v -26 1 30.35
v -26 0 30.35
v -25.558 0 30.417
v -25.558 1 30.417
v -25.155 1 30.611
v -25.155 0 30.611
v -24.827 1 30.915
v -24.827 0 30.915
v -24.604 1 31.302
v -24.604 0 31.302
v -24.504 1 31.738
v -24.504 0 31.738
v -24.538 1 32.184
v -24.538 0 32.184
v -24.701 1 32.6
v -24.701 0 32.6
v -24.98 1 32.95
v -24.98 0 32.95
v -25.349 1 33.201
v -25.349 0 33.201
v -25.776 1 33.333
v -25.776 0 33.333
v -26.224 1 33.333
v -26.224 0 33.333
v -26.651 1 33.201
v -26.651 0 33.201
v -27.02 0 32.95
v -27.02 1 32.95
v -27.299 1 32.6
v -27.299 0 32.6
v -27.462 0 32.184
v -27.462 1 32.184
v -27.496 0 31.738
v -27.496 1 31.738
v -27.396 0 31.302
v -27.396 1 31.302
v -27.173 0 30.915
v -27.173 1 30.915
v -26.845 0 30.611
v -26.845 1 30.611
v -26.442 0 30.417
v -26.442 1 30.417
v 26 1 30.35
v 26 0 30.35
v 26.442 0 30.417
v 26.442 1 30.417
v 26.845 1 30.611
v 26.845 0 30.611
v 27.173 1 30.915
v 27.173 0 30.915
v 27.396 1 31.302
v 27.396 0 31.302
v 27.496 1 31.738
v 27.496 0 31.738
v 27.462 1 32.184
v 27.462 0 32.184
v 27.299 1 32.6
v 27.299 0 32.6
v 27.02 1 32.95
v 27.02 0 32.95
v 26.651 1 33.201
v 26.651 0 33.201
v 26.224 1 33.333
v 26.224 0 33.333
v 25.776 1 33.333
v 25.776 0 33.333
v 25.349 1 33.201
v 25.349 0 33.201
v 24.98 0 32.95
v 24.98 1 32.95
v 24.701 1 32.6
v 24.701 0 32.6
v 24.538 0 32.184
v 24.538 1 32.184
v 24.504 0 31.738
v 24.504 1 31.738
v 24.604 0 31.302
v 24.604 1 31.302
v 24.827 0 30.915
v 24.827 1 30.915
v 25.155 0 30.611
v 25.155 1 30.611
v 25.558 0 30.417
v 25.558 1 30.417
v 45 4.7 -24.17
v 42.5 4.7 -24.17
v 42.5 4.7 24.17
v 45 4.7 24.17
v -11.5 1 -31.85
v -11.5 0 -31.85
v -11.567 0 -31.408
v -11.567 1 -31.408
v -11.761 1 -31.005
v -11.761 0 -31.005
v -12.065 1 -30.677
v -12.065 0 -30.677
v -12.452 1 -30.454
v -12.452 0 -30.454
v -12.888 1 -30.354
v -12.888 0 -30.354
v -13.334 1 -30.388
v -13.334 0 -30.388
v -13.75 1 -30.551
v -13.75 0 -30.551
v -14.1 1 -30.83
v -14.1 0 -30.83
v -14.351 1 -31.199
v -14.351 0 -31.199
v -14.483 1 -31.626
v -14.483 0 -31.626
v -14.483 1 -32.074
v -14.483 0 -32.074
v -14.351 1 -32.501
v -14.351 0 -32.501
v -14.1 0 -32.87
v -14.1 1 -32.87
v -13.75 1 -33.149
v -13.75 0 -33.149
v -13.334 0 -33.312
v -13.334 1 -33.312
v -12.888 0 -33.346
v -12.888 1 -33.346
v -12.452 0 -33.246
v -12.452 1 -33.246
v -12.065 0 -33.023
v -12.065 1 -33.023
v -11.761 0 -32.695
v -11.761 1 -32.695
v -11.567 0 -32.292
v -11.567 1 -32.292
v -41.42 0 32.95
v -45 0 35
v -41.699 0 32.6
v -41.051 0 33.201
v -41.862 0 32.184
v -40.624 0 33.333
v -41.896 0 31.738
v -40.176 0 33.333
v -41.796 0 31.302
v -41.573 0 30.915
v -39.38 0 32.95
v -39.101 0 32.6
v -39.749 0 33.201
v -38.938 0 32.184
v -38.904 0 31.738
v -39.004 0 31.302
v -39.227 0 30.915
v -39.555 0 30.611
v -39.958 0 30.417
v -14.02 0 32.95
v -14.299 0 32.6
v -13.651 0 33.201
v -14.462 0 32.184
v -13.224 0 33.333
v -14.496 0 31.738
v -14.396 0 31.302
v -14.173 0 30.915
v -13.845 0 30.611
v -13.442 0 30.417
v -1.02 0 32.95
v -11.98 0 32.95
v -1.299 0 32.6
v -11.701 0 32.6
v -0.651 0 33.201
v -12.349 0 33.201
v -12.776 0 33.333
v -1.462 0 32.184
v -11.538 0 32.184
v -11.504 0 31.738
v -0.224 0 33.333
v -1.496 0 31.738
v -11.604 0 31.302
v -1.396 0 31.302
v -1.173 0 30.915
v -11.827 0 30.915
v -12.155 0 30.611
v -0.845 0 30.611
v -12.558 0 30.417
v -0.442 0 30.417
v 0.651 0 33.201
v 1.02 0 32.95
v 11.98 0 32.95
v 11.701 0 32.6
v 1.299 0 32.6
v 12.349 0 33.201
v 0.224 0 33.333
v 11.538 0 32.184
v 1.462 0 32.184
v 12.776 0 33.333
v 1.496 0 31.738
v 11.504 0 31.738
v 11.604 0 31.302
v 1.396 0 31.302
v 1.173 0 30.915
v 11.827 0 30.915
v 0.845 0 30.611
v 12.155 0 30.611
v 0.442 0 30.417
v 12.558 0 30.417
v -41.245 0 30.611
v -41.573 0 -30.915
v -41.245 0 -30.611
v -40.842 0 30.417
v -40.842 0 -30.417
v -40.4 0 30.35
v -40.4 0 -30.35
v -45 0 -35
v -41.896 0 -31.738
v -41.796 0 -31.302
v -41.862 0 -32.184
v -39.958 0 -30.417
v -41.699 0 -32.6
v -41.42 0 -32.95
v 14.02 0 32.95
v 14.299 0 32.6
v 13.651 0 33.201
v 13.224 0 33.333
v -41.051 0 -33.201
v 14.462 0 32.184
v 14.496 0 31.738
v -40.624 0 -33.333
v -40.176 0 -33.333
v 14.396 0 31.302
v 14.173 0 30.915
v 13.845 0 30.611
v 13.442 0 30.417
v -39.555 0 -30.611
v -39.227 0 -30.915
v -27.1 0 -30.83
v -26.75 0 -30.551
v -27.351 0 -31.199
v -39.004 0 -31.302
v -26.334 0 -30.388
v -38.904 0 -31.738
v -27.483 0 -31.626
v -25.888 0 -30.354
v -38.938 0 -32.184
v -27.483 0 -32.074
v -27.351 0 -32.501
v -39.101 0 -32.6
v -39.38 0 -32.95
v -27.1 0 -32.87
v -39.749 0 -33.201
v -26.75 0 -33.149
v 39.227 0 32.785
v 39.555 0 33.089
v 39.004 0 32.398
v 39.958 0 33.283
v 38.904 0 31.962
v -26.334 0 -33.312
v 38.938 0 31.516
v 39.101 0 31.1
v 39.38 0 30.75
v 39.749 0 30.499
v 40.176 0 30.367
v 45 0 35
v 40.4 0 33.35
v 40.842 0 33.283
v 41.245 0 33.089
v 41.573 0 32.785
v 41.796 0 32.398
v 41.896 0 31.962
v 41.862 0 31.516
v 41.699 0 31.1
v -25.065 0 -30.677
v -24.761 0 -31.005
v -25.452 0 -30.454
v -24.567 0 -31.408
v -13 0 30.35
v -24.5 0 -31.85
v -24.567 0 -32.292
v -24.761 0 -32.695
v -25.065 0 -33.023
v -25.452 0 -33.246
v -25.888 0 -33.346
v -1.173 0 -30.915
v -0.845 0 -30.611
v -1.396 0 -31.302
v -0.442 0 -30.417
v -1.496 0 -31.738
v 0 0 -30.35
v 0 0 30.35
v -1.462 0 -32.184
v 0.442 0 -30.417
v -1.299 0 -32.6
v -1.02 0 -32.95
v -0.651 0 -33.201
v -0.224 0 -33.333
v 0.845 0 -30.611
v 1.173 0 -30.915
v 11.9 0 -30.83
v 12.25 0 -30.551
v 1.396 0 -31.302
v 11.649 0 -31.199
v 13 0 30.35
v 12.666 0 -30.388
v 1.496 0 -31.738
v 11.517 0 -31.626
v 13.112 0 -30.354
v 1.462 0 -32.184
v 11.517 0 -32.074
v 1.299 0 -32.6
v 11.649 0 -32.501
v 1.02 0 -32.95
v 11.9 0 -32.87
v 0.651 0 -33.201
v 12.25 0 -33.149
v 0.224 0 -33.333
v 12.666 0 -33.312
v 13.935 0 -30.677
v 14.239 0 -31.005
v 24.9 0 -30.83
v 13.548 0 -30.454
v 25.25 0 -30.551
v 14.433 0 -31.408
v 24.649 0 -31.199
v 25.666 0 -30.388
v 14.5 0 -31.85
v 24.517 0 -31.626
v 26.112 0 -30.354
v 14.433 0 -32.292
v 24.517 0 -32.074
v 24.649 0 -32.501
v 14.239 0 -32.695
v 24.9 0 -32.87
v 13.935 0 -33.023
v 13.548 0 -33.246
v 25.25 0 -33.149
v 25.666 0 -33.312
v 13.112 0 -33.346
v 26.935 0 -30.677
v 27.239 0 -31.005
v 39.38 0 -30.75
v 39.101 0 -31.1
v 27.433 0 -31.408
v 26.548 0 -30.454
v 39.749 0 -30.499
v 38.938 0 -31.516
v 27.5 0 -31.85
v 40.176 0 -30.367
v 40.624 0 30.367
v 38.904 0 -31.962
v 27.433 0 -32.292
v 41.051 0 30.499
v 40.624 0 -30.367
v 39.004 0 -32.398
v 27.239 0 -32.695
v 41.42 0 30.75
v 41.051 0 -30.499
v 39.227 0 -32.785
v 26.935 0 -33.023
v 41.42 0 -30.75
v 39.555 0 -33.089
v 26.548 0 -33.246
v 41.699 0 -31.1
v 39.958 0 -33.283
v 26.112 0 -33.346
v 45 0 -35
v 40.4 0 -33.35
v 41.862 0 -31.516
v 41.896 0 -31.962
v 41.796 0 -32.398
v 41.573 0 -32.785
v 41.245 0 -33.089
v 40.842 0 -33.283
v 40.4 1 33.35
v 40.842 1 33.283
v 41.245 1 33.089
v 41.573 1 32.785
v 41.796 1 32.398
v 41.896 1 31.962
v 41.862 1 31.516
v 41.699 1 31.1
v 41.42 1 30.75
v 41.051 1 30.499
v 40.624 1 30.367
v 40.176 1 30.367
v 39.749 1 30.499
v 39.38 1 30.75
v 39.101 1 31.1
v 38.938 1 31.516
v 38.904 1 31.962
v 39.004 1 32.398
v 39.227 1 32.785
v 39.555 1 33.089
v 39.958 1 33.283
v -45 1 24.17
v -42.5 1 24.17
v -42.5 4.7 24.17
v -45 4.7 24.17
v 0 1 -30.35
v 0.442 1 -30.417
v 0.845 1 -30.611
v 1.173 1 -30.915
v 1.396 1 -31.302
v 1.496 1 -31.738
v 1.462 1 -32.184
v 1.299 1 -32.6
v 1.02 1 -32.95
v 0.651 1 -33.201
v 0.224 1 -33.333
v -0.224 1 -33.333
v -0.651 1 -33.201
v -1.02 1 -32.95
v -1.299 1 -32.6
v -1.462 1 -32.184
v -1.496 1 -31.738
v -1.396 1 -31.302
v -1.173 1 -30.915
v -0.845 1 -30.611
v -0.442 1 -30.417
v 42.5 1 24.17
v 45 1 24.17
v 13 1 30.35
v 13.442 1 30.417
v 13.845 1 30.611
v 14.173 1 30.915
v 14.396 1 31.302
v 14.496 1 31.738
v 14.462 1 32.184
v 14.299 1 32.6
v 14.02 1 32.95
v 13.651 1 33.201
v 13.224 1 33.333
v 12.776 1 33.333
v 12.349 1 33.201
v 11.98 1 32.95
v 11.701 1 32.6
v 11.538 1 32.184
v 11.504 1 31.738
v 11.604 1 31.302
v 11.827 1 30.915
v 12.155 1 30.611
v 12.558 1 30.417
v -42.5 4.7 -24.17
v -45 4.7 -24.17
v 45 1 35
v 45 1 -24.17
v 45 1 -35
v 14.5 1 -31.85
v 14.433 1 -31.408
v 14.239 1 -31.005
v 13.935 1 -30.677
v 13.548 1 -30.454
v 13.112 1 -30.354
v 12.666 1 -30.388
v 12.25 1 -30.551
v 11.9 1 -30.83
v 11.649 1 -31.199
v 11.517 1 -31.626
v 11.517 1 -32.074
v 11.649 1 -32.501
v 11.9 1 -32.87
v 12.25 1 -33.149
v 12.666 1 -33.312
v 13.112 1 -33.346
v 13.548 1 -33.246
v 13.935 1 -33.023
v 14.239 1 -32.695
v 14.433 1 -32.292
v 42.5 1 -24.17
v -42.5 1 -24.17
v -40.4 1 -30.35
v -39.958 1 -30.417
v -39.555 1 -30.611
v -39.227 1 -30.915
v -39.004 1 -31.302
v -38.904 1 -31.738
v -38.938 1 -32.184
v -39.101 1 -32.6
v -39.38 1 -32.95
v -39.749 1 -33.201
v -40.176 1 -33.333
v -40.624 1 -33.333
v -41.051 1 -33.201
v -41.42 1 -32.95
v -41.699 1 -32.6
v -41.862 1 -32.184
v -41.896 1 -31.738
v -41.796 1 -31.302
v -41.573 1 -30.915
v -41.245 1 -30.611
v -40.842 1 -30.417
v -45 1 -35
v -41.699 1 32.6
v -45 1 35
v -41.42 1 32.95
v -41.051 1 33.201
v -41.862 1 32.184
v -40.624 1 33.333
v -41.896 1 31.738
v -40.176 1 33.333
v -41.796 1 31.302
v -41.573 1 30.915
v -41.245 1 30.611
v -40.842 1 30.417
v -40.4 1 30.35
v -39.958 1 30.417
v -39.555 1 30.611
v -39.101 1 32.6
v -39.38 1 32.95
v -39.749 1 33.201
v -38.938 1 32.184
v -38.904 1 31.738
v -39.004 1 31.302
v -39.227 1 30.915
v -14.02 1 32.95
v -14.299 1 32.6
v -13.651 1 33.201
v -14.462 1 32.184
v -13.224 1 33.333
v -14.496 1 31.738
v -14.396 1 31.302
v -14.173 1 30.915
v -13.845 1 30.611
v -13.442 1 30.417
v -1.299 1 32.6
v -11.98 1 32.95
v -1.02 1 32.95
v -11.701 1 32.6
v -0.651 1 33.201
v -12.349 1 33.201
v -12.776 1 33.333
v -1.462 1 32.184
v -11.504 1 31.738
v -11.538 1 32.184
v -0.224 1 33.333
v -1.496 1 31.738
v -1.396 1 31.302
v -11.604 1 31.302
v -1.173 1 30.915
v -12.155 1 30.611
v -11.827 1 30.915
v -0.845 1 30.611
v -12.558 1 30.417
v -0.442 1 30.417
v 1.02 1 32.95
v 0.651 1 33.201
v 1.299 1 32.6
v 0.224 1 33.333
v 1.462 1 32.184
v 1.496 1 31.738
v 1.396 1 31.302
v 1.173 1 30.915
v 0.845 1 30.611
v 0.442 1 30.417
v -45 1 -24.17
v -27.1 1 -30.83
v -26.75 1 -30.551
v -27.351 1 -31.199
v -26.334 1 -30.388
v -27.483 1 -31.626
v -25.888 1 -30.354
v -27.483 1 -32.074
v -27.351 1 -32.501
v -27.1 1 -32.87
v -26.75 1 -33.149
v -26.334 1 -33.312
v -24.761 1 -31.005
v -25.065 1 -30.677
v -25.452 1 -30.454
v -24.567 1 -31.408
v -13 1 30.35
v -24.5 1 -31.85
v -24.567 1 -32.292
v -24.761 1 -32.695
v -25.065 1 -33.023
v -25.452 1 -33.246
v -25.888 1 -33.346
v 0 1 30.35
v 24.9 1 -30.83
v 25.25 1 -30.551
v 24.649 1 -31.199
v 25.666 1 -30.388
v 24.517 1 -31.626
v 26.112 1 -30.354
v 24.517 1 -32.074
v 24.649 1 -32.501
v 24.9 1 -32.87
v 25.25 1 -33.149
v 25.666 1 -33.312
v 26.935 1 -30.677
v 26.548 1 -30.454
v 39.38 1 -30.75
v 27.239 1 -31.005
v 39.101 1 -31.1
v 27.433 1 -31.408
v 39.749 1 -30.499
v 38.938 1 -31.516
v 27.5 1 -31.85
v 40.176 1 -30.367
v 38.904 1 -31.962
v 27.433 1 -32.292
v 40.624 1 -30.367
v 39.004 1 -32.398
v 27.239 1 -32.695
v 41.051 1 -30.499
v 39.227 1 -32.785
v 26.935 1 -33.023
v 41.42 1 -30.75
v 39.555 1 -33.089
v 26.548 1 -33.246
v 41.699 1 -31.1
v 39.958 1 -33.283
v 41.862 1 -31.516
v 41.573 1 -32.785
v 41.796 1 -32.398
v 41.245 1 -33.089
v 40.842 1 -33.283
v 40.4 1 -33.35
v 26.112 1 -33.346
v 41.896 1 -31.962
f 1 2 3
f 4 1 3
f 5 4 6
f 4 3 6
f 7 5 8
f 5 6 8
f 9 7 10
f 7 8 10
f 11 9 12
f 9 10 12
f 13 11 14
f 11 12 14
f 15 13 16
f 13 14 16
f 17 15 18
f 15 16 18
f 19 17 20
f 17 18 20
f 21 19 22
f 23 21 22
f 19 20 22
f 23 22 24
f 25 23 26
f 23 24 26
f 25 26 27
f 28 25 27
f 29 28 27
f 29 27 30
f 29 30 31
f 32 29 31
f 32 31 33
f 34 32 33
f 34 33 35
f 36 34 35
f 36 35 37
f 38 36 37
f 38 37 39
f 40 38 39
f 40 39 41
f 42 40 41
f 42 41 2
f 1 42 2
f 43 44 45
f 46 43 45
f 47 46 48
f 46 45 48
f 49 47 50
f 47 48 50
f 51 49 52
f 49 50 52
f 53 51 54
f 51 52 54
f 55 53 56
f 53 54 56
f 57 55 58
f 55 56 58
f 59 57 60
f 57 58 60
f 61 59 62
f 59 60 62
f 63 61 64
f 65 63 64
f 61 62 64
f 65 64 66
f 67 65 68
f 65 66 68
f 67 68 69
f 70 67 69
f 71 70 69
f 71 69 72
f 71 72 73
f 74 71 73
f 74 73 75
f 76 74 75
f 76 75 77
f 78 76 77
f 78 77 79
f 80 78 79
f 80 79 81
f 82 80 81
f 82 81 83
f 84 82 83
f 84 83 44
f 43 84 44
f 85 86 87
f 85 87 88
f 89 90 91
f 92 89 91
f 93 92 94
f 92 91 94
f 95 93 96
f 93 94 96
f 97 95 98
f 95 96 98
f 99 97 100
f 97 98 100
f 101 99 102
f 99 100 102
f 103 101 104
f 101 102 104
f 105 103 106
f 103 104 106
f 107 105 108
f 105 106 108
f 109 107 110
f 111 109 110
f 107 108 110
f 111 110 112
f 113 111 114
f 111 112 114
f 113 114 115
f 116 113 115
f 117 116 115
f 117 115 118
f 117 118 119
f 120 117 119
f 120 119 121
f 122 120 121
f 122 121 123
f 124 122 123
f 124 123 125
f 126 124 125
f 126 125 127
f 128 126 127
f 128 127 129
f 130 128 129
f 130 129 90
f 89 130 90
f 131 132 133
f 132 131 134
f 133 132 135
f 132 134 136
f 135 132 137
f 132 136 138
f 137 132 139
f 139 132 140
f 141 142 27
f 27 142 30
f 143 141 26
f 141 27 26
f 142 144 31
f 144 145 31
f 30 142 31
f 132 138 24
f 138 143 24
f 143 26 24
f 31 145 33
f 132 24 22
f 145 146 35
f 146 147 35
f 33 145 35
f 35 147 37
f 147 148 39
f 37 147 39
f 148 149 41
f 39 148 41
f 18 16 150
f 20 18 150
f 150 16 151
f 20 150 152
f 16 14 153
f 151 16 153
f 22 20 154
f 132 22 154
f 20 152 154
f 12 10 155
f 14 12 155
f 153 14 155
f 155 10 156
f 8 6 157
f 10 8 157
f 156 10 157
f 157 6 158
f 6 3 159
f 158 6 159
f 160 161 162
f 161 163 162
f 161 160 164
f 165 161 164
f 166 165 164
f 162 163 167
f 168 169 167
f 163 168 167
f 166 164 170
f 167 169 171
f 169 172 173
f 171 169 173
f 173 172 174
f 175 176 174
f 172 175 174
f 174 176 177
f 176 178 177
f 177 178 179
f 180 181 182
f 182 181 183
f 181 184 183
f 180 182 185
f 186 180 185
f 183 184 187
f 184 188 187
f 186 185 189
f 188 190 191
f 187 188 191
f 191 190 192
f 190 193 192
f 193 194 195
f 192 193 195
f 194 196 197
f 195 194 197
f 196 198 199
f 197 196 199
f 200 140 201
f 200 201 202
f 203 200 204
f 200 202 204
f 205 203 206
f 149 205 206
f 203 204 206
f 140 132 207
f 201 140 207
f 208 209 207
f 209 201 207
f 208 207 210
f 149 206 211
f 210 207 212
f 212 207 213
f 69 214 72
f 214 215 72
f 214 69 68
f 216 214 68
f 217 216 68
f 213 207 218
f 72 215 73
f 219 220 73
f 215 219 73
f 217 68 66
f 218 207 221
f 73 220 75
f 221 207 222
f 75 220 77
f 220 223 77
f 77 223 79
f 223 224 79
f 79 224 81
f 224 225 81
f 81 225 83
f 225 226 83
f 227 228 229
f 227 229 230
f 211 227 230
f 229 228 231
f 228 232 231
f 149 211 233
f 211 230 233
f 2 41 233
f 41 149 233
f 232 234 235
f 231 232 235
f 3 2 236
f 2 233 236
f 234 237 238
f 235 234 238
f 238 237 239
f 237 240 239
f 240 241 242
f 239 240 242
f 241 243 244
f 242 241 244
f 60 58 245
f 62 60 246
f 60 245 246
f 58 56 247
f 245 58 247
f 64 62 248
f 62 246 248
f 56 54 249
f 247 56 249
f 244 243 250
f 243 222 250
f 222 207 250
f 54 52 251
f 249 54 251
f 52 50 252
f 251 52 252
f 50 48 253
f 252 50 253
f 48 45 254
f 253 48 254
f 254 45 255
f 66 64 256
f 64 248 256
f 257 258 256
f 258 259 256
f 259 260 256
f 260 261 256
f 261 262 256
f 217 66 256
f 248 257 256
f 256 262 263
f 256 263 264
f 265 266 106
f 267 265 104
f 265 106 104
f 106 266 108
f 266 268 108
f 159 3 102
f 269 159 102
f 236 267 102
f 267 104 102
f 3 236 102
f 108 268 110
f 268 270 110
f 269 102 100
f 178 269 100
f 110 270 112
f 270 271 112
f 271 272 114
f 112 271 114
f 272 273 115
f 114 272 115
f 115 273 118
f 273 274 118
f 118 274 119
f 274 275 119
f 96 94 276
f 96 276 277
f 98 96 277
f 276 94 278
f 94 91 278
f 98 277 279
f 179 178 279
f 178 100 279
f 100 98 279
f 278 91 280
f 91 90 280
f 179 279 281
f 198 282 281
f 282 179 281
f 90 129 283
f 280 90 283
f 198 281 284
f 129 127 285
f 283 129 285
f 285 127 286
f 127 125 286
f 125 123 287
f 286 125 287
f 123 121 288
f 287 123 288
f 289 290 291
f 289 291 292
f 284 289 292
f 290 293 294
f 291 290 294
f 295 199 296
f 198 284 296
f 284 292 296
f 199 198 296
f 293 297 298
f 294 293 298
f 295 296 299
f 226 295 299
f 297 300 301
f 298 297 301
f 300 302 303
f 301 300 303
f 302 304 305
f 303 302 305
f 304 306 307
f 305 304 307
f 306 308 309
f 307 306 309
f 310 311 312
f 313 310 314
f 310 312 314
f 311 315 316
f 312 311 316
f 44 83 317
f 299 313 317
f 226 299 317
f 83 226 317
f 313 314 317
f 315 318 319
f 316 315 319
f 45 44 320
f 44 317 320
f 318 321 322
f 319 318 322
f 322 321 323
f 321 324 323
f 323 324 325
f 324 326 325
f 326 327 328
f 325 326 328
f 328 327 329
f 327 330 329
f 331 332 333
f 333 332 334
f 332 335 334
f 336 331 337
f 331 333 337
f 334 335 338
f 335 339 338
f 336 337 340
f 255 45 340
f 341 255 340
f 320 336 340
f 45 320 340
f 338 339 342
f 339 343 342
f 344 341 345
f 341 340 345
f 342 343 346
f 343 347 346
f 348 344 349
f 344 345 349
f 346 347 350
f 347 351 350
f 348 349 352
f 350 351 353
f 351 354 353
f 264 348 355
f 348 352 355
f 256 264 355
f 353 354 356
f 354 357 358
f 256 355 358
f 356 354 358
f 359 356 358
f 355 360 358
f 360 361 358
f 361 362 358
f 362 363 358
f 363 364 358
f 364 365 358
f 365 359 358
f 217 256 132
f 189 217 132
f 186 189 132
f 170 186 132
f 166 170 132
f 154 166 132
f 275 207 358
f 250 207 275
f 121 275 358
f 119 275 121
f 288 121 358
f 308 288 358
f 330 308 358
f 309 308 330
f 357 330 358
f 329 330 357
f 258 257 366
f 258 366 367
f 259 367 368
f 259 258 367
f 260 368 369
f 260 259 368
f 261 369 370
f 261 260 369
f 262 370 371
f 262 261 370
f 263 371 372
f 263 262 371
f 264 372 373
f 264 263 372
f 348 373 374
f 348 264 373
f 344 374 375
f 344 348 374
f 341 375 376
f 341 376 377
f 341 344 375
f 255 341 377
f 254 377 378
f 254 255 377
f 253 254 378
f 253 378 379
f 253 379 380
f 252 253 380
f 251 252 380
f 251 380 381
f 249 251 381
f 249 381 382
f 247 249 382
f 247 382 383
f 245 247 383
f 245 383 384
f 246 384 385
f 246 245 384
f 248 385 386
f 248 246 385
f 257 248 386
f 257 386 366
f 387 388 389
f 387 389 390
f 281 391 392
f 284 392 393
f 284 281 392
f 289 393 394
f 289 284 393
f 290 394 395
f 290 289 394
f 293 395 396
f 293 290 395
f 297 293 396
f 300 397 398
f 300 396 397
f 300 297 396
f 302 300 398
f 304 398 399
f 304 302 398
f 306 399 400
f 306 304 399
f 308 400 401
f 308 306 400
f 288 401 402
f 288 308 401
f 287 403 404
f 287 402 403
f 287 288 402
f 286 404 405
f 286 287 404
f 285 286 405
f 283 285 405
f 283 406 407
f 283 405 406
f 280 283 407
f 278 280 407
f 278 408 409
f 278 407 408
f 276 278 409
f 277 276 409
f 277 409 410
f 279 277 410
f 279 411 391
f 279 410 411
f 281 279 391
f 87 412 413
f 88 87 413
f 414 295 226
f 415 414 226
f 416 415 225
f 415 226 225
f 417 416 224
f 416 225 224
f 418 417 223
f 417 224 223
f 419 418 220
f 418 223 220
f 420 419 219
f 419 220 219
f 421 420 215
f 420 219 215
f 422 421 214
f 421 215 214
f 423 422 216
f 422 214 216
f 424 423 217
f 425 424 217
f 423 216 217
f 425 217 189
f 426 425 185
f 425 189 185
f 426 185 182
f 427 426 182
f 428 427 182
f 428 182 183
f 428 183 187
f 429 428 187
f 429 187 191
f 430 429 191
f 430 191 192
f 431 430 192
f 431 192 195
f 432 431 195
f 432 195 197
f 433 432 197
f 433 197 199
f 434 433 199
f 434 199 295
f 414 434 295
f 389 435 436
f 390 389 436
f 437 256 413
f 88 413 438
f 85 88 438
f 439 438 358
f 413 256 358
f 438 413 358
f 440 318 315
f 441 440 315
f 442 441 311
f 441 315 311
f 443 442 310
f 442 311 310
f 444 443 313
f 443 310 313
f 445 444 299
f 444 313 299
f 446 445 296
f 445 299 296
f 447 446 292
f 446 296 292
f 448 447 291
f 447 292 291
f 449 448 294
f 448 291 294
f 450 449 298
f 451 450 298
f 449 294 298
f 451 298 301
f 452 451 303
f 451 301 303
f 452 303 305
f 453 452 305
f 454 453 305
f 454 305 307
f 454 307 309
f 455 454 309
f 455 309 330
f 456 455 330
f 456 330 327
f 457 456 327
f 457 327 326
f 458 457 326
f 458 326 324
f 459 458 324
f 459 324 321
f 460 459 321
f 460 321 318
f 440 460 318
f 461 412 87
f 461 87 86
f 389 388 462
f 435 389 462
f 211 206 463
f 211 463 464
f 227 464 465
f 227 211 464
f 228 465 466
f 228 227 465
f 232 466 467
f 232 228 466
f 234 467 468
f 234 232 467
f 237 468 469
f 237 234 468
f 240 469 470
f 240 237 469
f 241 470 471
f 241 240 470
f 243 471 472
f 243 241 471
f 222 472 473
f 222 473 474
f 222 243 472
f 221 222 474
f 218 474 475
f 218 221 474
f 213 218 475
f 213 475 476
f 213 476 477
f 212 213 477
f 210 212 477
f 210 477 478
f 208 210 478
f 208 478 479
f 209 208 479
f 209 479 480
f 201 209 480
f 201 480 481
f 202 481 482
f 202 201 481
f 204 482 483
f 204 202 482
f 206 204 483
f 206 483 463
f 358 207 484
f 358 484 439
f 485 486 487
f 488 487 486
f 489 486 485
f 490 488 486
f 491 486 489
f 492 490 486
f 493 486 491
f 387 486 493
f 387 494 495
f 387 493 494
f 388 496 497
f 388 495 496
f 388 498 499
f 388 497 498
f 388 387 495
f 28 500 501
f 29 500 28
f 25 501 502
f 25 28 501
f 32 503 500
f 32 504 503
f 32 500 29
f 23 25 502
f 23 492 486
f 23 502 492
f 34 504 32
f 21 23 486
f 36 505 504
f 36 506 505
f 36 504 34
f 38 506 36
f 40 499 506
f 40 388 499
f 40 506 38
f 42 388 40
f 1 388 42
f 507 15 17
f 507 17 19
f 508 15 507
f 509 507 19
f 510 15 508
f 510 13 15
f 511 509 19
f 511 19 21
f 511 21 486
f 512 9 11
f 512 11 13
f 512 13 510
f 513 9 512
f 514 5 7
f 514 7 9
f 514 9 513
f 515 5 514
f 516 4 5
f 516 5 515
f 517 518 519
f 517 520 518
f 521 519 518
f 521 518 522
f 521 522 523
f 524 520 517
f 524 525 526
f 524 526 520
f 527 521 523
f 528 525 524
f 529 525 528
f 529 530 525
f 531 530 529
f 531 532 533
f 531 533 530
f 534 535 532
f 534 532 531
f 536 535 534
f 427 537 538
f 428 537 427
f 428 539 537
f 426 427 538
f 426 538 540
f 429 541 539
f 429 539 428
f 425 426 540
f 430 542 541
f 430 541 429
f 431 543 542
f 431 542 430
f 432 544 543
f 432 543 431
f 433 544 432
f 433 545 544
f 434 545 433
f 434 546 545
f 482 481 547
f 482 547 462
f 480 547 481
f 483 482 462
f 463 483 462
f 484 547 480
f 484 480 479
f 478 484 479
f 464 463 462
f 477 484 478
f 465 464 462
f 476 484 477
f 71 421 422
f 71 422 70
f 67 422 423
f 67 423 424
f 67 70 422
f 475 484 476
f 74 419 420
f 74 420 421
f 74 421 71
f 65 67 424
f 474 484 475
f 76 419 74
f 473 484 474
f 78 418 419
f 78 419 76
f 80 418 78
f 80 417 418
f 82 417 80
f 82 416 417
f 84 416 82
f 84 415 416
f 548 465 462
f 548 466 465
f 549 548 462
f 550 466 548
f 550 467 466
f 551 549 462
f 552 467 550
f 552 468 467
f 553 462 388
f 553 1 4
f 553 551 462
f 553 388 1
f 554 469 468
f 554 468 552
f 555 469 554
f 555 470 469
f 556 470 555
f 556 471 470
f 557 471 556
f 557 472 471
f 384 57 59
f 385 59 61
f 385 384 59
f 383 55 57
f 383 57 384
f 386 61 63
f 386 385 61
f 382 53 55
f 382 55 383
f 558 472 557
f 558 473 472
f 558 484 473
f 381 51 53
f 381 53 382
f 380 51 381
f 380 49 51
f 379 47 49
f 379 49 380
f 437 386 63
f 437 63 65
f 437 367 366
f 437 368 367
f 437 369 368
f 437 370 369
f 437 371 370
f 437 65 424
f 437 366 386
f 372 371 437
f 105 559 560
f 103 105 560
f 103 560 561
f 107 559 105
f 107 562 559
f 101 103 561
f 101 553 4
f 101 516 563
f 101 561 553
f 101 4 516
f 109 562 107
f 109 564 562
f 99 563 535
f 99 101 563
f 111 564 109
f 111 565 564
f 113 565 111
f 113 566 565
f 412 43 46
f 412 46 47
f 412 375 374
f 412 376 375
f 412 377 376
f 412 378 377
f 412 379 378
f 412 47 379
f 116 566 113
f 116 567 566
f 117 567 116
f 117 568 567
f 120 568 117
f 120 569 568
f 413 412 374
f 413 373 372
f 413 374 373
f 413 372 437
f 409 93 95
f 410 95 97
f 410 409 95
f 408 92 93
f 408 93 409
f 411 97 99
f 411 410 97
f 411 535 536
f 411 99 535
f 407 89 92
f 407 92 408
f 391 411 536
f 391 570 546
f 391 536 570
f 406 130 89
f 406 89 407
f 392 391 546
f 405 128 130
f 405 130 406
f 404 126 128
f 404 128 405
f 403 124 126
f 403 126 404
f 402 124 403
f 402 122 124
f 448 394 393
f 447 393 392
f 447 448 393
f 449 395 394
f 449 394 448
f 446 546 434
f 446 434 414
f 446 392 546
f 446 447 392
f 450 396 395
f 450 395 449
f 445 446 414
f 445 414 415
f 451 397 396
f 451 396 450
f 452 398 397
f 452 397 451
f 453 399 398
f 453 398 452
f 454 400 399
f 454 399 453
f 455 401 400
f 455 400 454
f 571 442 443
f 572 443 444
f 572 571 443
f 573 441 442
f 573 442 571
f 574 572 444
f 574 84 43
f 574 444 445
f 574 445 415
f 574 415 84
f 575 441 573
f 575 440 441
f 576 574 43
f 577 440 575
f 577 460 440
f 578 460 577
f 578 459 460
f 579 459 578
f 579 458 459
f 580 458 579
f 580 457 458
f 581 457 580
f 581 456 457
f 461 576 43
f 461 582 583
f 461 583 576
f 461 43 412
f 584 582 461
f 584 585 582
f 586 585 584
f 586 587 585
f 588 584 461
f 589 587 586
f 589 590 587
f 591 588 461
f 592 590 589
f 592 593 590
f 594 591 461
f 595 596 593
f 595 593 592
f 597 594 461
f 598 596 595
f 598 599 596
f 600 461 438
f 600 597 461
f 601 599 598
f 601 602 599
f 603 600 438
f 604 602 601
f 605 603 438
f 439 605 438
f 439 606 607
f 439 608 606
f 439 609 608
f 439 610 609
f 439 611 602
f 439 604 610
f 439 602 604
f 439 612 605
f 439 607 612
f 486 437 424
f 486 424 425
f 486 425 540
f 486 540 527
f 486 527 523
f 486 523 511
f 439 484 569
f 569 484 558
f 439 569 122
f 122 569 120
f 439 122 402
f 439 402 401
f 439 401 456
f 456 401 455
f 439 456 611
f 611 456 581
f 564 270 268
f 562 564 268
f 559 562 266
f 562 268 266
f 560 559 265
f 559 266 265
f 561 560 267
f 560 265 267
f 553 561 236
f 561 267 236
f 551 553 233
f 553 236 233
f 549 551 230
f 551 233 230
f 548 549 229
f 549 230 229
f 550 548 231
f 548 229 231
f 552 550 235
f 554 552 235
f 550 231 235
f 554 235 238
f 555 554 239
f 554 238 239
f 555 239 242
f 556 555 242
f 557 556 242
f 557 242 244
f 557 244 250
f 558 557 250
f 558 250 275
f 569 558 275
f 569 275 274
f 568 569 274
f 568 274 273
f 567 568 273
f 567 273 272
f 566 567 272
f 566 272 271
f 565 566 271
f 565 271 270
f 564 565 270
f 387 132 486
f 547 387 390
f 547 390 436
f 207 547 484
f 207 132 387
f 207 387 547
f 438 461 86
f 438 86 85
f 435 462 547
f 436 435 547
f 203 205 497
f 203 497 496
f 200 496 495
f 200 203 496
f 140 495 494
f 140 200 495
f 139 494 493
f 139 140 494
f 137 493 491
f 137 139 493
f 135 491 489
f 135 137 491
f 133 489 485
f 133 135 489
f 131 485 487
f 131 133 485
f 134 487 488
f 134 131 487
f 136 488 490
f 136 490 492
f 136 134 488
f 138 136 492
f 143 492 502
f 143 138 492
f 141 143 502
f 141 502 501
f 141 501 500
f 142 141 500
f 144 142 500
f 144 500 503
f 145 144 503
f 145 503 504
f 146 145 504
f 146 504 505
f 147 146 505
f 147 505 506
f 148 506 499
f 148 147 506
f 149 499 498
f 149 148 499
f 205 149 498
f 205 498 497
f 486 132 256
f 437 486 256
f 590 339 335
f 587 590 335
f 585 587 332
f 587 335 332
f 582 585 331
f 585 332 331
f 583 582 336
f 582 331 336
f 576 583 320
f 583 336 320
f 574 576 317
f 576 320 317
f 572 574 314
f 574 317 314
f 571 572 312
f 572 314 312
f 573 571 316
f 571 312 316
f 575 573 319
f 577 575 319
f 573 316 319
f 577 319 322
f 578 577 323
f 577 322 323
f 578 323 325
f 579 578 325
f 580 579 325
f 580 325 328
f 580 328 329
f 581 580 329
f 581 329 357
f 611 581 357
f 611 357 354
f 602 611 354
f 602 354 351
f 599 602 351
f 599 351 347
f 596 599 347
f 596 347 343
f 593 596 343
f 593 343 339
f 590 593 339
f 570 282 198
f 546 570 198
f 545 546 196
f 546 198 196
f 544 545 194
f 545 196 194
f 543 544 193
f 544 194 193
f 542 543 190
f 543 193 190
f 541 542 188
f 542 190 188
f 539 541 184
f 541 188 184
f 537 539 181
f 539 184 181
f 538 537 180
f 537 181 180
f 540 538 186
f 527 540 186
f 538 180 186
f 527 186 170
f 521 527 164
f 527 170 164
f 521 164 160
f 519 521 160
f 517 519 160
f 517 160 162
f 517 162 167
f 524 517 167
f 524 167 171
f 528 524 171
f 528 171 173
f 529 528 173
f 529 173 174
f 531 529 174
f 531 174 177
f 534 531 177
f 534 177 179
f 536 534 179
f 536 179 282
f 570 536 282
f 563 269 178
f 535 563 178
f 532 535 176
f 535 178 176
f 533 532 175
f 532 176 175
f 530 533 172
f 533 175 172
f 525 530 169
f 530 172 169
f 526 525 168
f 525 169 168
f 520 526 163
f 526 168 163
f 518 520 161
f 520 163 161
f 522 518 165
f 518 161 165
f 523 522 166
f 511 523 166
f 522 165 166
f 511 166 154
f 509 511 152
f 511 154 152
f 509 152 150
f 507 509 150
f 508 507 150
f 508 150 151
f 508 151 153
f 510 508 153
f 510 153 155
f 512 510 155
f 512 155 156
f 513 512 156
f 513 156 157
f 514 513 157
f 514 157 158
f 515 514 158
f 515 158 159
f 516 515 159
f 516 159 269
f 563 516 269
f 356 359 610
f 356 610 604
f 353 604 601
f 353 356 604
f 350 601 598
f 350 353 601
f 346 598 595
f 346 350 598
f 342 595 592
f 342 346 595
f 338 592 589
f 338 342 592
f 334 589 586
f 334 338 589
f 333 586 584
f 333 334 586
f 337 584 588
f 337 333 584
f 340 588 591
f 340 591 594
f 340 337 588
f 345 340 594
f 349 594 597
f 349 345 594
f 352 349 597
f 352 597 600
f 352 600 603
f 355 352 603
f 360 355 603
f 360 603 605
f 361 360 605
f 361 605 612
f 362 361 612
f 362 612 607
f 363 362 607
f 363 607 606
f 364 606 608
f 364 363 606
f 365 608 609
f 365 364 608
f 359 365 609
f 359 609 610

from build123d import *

# Parameters (mm, degrees)
SKETCH_1_W                 = 90
SKETCH_1_H                 = 70
SKETCH_1_R                 = 1.5
EXTRUDE_1_DEPTH            = 1
SKETCH_2_W                 = 2.5
SKETCH_2_H                 = 48.34
EXTRUDE_2_DEPTH            = 3.7
SKETCH_4_R                 = 1.5
CUT_EXTRUDE_1_DEPTH        = 10
PATTERN_LINEAR_1_COUNT     = 3
PATTERN_LINEAR_1_PITCH     = 13
PATTERN_LINEAR_1_COL_COUNT = 3
PATTERN_LINEAR_1_COL_PITCH = 13
MIRROR_2_COPY_1_SKETCH_R   = 1.5
MIRROR_2_COPY_1_DEPTH      = 10
MIRROR_2_COPY_2_SKETCH_R   = 1.5
MIRROR_2_COPY_2_DEPTH      = 10
MIRROR_2_COPY_3_SKETCH_R   = 1.5
MIRROR_2_COPY_3_DEPTH      = 10
MIRROR_2_COPY_4_SKETCH_R   = 1.5
MIRROR_2_COPY_4_DEPTH      = 10


with BuildPart() as part:
    # 草图1 → 凸台-拉伸1 (new body)
    with BuildSketch(Plane(origin=(0, 0, 0), x_dir=(1, 0, 0), z_dir=(0, 1, 0))):
        Rectangle(SKETCH_1_W, SKETCH_1_H)
        with Locations(Location((40.4, -31.85, 0), (0, 0, 270))):
            Circle(SKETCH_1_R, mode=Mode.SUBTRACT)
        with Locations(Location((-40.4, -31.85, 0), (0, 0, 90))):
            Circle(SKETCH_1_R, mode=Mode.SUBTRACT)
        with Locations(Location((40.4, 31.85, 0), (0, 0, 90))):
            Circle(SKETCH_1_R, mode=Mode.SUBTRACT)
        with Locations(Location((-40.4, 31.85, 0), (0, 0, 270))):
            Circle(SKETCH_1_R, mode=Mode.SUBTRACT)
    extrude(amount=EXTRUDE_1_DEPTH)

    # 草图2 → 凸台-拉伸2 (add)
    with BuildSketch(Plane(origin=(0, 1, 0), x_dir=(1, 0, 0), z_dir=(0, 1, 0))):
        with Locations((43.75, 0)):
            Rectangle(SKETCH_2_W, SKETCH_2_H)
    extrude_2 = extrude(amount=EXTRUDE_2_DEPTH)

    # 镜向1: 凸台-拉伸2 across plane
    add(extrude_2.mirror(Plane(origin=(0, 0, 0), x_dir=(0, 0, 1), z_dir=(1, 0, 0))))

    # 草图4 → 切除-拉伸1 (cut)
    with BuildSketch(Plane.XZ):
        with Locations(Location((0, 31.85, 0), (0, 0, 270))):
            Circle(SKETCH_4_R)
    cut_extrude_1 = extrude(amount=-CUT_EXTRUDE_1_DEPTH, mode=Mode.SUBTRACT)

    # 阵列(线性)1: 切除-拉伸1 ×3
    with Locations(*[(-i * PATTERN_LINEAR_1_PITCH, 0, 0) for i in range(1, PATTERN_LINEAR_1_COUNT)]):
        add(cut_extrude_1, mode=Mode.SUBTRACT)

    # 阵列(线性)1 col: 切除-拉伸1 ×3
    with Locations(*[(i * PATTERN_LINEAR_1_COL_PITCH, 0, 0) for i in range(1, PATTERN_LINEAR_1_COL_COUNT)]):
        add(cut_extrude_1, mode=Mode.SUBTRACT)

    # 镜向2: 切除-拉伸1 across plane
    add(cut_extrude_1.mirror(Plane.XY), mode=Mode.SUBTRACT)

    # 镜向2 copy 1 sketch → 镜向2 copy 1 (cut)
    with BuildSketch(Plane(origin=(-13, 0, 0), x_dir=(1, 0, 0), z_dir=(0, -1, 0))):
        with Locations((0, -31.85)):
            Circle(MIRROR_2_COPY_1_SKETCH_R)
    extrude(amount=-MIRROR_2_COPY_1_DEPTH, mode=Mode.SUBTRACT)

    # 镜向2 copy 2 sketch → 镜向2 copy 2 (cut)
    with BuildSketch(Plane(origin=(-26, 0, 0), x_dir=(1, 0, 0), z_dir=(0, -1, 0))):
        with Locations((0, -31.85)):
            Circle(MIRROR_2_COPY_2_SKETCH_R)
    extrude(amount=-MIRROR_2_COPY_2_DEPTH, mode=Mode.SUBTRACT)

    # 镜向2 copy 3 sketch → 镜向2 copy 3 (cut)
    with BuildSketch(Plane(origin=(13, 0, 0), x_dir=(1, 0, 0), z_dir=(0, -1, 0))):
        with Locations((0, -31.85)):
            Circle(MIRROR_2_COPY_3_SKETCH_R)
    extrude(amount=-MIRROR_2_COPY_3_DEPTH, mode=Mode.SUBTRACT)

    # 镜向2 copy 4 sketch → 镜向2 copy 4 (cut)
    with BuildSketch(Plane(origin=(26, 0, 0), x_dir=(1, 0, 0), z_dir=(0, -1, 0))):
        with Locations((0, -31.85)):
            Circle(MIRROR_2_COPY_4_SKETCH_R)
    extrude(amount=-MIRROR_2_COPY_4_DEPTH, mode=Mode.SUBTRACT)


solid = part.part
